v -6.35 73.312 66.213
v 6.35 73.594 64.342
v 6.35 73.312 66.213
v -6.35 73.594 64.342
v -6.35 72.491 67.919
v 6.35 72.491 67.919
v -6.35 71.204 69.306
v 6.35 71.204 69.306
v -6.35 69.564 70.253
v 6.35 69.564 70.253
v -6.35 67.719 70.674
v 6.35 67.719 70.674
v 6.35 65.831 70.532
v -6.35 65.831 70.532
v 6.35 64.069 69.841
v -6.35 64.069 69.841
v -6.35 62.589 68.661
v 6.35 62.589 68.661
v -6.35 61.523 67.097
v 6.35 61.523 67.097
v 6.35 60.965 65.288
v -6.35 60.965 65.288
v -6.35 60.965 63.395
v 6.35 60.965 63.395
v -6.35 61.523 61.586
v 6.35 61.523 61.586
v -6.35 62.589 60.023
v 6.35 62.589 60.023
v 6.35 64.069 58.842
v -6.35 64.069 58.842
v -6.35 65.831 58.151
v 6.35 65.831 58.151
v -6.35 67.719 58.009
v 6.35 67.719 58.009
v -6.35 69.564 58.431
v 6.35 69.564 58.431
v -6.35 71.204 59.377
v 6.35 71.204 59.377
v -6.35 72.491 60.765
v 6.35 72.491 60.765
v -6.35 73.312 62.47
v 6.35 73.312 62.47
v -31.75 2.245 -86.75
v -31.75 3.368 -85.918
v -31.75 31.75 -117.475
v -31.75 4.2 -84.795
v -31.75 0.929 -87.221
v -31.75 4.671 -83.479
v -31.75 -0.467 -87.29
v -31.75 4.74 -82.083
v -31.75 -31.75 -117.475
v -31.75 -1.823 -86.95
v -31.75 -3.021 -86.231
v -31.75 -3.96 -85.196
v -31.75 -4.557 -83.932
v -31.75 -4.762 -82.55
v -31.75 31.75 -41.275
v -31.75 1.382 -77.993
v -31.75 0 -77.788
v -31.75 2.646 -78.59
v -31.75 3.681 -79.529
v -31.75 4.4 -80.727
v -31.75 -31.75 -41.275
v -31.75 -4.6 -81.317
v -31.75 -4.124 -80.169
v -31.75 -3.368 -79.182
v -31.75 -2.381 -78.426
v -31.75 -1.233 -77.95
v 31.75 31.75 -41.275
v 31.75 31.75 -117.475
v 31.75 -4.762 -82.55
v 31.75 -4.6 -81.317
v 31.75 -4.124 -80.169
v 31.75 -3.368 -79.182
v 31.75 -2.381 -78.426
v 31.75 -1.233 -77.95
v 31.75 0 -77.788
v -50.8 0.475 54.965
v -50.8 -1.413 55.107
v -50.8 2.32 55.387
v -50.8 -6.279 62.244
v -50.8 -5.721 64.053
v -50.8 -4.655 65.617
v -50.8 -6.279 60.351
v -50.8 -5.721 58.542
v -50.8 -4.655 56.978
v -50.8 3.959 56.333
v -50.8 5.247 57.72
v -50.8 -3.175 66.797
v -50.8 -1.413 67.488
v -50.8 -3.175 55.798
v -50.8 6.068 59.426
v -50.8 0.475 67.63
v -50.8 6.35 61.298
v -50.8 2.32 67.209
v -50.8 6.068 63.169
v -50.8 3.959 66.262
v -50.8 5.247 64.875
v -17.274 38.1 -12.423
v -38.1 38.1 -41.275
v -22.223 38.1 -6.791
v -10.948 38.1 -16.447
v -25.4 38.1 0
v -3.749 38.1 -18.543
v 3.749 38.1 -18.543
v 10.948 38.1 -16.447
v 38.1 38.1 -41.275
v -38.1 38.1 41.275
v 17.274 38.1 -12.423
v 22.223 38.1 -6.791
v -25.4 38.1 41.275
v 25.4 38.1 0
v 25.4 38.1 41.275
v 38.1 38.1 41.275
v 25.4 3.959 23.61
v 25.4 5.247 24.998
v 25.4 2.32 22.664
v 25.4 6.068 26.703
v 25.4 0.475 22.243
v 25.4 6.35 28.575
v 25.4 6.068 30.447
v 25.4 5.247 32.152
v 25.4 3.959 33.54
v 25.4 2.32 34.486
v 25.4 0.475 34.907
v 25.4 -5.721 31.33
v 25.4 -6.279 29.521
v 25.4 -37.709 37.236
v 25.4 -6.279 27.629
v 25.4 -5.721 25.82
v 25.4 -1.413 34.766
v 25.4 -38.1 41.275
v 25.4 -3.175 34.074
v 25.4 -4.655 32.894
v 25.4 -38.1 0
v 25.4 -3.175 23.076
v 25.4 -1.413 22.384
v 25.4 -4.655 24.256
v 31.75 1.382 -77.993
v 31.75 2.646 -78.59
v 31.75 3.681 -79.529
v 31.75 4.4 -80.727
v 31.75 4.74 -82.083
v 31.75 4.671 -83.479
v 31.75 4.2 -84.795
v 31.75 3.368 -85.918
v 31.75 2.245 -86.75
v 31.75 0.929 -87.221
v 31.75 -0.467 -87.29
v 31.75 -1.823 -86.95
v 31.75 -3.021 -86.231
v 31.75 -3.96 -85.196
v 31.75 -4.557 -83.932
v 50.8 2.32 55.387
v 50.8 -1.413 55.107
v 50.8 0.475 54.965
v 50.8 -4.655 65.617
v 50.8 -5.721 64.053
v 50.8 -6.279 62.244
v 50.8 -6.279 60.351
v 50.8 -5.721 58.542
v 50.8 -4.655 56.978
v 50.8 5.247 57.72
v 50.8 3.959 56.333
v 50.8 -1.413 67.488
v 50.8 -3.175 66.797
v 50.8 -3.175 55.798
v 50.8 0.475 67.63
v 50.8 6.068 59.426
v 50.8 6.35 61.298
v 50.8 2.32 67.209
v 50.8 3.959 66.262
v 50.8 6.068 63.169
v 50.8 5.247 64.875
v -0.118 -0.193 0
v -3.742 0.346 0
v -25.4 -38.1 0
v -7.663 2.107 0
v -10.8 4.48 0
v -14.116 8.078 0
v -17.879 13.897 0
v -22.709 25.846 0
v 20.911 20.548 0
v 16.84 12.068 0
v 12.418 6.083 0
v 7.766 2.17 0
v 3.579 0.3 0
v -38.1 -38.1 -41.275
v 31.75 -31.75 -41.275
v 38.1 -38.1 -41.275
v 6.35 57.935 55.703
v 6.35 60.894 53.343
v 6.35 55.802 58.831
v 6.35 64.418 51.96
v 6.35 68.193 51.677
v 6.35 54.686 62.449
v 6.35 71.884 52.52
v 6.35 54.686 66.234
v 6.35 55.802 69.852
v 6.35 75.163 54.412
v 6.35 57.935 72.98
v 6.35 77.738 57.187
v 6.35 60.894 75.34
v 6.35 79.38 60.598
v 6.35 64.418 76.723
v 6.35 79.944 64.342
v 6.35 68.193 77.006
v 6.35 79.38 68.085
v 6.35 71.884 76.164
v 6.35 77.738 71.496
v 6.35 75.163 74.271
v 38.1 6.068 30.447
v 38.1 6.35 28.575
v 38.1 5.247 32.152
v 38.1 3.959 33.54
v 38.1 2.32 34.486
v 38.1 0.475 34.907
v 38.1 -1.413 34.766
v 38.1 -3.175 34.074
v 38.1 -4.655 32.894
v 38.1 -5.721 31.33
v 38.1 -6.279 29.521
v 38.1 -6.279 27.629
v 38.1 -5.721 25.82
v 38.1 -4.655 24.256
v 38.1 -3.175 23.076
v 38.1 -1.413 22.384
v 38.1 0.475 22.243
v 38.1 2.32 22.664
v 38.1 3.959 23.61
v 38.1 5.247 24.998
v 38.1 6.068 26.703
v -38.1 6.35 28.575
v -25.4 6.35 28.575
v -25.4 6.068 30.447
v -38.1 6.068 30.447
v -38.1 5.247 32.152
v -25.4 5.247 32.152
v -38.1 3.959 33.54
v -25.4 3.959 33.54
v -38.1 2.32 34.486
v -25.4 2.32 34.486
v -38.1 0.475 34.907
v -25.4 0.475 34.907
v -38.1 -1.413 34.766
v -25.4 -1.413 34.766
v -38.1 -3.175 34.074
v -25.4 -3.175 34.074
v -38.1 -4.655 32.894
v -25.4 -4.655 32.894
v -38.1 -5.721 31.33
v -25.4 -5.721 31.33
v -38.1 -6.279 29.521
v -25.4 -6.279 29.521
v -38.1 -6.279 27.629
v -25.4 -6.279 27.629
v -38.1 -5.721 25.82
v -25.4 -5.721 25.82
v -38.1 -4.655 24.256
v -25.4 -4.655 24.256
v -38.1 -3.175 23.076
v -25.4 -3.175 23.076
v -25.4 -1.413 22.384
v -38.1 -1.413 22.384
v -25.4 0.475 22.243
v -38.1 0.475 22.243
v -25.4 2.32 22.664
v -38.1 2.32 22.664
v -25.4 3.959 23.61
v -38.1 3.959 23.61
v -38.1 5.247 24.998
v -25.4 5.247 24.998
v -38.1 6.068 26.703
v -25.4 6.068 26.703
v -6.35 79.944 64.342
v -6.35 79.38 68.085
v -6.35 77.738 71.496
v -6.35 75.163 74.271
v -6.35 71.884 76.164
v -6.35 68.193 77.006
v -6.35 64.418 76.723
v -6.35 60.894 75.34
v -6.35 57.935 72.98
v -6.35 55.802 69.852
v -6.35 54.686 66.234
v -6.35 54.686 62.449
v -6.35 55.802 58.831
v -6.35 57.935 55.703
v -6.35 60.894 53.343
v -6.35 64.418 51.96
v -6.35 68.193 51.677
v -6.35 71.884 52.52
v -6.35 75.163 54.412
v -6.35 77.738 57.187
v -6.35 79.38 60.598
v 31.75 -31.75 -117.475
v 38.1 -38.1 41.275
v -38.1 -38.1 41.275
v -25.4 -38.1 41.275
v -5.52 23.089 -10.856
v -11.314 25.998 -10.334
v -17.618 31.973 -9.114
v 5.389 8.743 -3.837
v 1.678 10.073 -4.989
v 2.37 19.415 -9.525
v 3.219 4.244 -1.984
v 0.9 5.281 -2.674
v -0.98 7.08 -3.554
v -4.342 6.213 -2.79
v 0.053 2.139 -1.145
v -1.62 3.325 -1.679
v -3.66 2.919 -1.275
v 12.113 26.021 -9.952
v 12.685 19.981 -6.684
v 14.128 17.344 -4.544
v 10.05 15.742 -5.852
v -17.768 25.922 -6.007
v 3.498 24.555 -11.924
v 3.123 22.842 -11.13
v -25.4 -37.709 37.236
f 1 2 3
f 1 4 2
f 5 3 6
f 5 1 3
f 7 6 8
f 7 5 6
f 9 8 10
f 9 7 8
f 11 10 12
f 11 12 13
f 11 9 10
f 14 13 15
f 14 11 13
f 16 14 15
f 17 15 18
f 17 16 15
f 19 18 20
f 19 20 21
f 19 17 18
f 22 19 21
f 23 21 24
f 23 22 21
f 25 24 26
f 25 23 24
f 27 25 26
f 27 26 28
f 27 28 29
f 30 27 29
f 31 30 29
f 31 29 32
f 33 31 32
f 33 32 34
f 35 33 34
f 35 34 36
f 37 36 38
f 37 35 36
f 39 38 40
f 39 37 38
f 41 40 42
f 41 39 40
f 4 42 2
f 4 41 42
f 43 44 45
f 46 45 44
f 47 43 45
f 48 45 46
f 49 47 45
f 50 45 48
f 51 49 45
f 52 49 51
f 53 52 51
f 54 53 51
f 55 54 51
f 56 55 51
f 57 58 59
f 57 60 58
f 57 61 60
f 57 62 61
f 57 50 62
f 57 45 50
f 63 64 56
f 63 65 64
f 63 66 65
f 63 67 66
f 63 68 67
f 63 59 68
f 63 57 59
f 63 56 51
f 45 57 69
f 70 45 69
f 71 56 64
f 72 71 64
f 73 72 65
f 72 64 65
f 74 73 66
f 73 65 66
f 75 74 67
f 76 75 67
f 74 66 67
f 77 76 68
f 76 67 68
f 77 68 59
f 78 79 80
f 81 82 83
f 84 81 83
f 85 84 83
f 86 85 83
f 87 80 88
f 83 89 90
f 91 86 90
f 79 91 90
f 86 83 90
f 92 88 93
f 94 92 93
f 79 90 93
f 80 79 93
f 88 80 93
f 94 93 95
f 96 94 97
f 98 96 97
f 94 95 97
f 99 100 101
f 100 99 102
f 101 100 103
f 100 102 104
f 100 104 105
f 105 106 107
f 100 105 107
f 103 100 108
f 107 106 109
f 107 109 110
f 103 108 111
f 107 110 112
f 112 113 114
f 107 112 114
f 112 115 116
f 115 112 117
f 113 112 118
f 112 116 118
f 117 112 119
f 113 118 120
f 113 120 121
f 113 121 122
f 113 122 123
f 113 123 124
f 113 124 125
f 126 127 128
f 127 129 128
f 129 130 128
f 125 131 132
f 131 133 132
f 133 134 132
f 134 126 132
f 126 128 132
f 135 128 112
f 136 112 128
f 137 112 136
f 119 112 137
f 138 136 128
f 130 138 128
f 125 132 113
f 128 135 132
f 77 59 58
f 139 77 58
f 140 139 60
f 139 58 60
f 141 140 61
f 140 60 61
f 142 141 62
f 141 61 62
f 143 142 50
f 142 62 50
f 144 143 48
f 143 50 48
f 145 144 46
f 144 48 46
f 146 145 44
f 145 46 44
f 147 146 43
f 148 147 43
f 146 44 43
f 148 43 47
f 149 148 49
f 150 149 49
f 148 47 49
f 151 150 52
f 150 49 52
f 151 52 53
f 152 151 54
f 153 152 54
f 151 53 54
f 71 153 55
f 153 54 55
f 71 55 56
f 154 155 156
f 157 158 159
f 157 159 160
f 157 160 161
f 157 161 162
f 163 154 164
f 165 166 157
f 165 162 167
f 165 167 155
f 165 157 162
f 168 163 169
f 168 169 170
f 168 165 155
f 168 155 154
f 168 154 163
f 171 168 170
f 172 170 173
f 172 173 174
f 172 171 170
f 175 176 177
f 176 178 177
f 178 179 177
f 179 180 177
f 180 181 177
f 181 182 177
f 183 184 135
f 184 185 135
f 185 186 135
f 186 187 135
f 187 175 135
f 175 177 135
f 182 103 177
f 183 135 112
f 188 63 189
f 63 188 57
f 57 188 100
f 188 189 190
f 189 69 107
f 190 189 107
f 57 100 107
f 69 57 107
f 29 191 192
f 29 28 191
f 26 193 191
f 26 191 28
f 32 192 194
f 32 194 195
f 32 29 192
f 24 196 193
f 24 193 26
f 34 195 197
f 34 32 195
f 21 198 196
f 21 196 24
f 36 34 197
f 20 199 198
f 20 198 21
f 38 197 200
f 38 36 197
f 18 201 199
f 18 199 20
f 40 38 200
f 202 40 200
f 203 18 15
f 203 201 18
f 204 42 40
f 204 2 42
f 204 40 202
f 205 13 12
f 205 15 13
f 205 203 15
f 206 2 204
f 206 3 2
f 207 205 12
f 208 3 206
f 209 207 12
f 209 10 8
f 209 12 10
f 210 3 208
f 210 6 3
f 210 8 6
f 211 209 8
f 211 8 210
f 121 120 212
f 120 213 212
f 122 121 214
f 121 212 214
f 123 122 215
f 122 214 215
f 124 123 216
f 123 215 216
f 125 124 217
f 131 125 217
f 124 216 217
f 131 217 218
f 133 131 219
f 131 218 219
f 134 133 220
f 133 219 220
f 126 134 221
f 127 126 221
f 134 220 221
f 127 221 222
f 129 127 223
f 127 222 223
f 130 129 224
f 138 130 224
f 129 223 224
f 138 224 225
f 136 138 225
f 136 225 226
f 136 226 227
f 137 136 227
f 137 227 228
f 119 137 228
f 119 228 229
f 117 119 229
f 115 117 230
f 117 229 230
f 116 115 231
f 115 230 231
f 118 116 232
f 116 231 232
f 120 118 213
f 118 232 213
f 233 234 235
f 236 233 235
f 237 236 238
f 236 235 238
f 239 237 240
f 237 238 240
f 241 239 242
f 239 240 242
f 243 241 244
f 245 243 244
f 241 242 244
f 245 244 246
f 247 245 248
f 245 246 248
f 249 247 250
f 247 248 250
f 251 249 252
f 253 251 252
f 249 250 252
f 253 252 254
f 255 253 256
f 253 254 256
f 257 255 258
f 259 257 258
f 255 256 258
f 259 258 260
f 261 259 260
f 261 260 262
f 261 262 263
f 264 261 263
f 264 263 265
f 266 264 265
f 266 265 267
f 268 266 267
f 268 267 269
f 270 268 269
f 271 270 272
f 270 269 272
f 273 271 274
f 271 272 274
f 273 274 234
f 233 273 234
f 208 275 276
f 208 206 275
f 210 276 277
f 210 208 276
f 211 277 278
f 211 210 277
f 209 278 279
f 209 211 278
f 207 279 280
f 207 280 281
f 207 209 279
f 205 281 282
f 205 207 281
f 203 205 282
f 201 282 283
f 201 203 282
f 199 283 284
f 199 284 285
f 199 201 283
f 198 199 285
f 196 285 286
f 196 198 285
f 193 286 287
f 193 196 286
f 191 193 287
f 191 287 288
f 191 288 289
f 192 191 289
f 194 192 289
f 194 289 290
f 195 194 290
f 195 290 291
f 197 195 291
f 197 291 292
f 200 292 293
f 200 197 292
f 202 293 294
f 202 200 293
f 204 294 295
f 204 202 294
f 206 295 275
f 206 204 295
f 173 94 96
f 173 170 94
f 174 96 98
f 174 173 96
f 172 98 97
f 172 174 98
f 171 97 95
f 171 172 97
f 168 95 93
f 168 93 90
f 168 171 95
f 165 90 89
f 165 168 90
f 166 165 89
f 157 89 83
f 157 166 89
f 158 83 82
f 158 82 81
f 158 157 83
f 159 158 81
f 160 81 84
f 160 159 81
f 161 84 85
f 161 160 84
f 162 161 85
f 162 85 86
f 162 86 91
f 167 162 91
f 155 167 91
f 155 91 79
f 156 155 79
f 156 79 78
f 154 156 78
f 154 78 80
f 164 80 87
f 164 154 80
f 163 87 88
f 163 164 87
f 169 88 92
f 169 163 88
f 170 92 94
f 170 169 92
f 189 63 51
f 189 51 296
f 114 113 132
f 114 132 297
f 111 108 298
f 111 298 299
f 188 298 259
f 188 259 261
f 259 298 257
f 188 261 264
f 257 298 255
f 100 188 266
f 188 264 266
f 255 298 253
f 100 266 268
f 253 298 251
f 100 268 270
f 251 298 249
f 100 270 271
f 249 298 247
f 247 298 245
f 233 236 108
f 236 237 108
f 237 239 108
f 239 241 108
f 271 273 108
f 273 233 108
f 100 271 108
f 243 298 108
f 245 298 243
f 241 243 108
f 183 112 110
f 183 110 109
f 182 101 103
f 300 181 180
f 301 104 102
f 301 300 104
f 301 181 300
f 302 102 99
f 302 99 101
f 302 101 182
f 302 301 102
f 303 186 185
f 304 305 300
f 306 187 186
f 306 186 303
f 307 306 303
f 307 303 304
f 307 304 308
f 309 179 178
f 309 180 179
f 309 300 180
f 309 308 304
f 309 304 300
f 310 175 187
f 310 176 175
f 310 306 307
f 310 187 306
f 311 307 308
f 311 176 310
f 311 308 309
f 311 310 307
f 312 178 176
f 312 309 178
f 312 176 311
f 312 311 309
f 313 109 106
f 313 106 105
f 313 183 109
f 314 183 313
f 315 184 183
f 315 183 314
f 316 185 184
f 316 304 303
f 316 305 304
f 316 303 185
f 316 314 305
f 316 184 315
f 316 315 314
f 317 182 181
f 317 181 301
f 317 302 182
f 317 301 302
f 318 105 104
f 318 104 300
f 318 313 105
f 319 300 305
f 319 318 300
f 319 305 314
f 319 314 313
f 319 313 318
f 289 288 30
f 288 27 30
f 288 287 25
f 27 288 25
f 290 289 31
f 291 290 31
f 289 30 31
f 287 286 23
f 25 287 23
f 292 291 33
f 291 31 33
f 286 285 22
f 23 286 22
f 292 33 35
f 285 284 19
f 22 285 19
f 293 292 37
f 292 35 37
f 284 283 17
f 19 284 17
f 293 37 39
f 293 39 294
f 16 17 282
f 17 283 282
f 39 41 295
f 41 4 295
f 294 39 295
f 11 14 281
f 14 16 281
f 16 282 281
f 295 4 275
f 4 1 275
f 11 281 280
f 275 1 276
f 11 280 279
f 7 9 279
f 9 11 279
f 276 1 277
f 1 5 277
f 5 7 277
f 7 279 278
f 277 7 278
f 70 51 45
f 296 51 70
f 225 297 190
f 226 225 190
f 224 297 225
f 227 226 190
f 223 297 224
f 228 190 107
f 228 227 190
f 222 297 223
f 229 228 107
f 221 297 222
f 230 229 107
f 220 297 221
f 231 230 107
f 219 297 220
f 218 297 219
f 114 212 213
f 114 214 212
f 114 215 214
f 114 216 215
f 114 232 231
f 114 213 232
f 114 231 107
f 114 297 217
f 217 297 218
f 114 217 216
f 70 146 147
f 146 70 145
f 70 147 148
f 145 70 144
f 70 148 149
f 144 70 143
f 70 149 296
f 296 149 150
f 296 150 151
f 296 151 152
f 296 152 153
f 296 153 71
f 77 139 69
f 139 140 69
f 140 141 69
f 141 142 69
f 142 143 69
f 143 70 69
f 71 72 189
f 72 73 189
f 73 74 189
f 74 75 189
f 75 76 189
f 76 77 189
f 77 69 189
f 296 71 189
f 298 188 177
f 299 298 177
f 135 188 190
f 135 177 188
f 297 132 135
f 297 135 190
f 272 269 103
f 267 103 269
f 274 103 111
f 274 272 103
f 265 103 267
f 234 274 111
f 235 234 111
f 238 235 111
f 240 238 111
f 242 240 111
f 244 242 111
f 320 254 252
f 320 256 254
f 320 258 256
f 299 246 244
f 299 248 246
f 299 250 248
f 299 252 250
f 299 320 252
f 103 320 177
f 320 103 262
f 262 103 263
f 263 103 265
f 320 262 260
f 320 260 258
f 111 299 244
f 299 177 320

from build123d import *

# Parameters (mm, degrees)
F0_W      = 76.2
F0_H      = 76.2
F1_DEPTH  = 41.275
F2_W      = 50.8
F2_H      = 41.275
F3_DEPTH  = 38.1
F4_R      = 6.35
F5_DEPTH  = 38.1
F9_W      = 63.5
F9_H      = 63.5
F10_DEPTH = 76.2
F12_DEPTH = 69.851
F13_R     = 6.35
F14_DEPTH = 50.8
F15_R     = 12.7
F15_R_2   = 6.35
F16_DEPTH = 6.35


with BuildPart() as f1:
    # F0 (on Top) → F1 (new body, symmetric)
    with BuildSketch(Plane.XY):
        Rectangle(F0_W, F0_H)
    extrude(amount=F1_DEPTH, both=True)

    # F2 (on Front) → F3 (cut, symmetric)
    with BuildSketch(Plane.XZ):
        with Locations((0, 20.6375)):
            Rectangle(F2_W, F2_H)
    extrude(amount=F3_DEPTH, both=True, mode=Mode.SUBTRACT)

    # F4 (on Right) → F5 (cut, symmetric)
    with BuildSketch(Plane.YZ):
        with Locations((0, 28.575)):
            Circle(F4_R)
    extrude(amount=F5_DEPTH, both=True, mode=Mode.SUBTRACT)

    # F8: sweep along a path in F6
    with BuildLine(Plane.YZ) as f8_path:
        Line((38.1, -18.809034), (-37.708998, 18.427124))
    # F7 (on face) → F8 (sweep, cut)
    with BuildSketch(Plane(origin=(0, 38.1, 0), x_dir=(-1, 0, 0), z_dir=(0, 1, 0))):
        with BuildLine():
            Line((25.4, 0), (-25.4, 0))
            ThreePointArc((-25.4, 0), (0, -18.809034), (25.4, 0))
        make_face()
    sweep(path=f8_path.line, mode=Mode.SUBTRACT)

    # F9 (on face) → F10 (join)
    with BuildSketch(Plane(origin=(0, 0, -41.275), x_dir=(1, 0, 0), z_dir=(0, 0, -1))):
        Rectangle(F9_W, F9_H)
    extrude(amount=F10_DEPTH)

    # F11 (on face) → F12 (cut, through all)
    with BuildSketch(Plane(origin=(-31.75, 0, 0), x_dir=(0, -1, 0), z_dir=(-1, 0, 0))):
        with BuildLine():
            ThreePointArc((4.7625, -82.55), (3.367596, -79.182404), (0, -77.7875))
            ThreePointArc((0, -77.7875), (-3.367596, -85.917596), (4.7625, -82.55))
        make_face()
    extrude(amount=-F12_DEPTH, mode=Mode.SUBTRACT)


with BuildPart() as f14:
    # F13 (on Right) → F14 (new body, symmetric)
    with BuildSketch(Plane.YZ):
        with Locations((0, 61.297577)):
            Circle(F13_R)
    extrude(amount=F14_DEPTH, both=True)


with BuildPart() as f16:
    # F15 (on Right) → F16 (new body, symmetric)
    with BuildSketch(Plane.YZ):
        with Locations((67.244351, 64.341635)):
            Circle(F15_R)
        with Locations((67.244351, 64.341635)):
            Circle(F15_R_2, mode=Mode.SUBTRACT)
    extrude(amount=F16_DEPTH, both=True)


solid = Compound([f1.part, f14.part, f16.part])
